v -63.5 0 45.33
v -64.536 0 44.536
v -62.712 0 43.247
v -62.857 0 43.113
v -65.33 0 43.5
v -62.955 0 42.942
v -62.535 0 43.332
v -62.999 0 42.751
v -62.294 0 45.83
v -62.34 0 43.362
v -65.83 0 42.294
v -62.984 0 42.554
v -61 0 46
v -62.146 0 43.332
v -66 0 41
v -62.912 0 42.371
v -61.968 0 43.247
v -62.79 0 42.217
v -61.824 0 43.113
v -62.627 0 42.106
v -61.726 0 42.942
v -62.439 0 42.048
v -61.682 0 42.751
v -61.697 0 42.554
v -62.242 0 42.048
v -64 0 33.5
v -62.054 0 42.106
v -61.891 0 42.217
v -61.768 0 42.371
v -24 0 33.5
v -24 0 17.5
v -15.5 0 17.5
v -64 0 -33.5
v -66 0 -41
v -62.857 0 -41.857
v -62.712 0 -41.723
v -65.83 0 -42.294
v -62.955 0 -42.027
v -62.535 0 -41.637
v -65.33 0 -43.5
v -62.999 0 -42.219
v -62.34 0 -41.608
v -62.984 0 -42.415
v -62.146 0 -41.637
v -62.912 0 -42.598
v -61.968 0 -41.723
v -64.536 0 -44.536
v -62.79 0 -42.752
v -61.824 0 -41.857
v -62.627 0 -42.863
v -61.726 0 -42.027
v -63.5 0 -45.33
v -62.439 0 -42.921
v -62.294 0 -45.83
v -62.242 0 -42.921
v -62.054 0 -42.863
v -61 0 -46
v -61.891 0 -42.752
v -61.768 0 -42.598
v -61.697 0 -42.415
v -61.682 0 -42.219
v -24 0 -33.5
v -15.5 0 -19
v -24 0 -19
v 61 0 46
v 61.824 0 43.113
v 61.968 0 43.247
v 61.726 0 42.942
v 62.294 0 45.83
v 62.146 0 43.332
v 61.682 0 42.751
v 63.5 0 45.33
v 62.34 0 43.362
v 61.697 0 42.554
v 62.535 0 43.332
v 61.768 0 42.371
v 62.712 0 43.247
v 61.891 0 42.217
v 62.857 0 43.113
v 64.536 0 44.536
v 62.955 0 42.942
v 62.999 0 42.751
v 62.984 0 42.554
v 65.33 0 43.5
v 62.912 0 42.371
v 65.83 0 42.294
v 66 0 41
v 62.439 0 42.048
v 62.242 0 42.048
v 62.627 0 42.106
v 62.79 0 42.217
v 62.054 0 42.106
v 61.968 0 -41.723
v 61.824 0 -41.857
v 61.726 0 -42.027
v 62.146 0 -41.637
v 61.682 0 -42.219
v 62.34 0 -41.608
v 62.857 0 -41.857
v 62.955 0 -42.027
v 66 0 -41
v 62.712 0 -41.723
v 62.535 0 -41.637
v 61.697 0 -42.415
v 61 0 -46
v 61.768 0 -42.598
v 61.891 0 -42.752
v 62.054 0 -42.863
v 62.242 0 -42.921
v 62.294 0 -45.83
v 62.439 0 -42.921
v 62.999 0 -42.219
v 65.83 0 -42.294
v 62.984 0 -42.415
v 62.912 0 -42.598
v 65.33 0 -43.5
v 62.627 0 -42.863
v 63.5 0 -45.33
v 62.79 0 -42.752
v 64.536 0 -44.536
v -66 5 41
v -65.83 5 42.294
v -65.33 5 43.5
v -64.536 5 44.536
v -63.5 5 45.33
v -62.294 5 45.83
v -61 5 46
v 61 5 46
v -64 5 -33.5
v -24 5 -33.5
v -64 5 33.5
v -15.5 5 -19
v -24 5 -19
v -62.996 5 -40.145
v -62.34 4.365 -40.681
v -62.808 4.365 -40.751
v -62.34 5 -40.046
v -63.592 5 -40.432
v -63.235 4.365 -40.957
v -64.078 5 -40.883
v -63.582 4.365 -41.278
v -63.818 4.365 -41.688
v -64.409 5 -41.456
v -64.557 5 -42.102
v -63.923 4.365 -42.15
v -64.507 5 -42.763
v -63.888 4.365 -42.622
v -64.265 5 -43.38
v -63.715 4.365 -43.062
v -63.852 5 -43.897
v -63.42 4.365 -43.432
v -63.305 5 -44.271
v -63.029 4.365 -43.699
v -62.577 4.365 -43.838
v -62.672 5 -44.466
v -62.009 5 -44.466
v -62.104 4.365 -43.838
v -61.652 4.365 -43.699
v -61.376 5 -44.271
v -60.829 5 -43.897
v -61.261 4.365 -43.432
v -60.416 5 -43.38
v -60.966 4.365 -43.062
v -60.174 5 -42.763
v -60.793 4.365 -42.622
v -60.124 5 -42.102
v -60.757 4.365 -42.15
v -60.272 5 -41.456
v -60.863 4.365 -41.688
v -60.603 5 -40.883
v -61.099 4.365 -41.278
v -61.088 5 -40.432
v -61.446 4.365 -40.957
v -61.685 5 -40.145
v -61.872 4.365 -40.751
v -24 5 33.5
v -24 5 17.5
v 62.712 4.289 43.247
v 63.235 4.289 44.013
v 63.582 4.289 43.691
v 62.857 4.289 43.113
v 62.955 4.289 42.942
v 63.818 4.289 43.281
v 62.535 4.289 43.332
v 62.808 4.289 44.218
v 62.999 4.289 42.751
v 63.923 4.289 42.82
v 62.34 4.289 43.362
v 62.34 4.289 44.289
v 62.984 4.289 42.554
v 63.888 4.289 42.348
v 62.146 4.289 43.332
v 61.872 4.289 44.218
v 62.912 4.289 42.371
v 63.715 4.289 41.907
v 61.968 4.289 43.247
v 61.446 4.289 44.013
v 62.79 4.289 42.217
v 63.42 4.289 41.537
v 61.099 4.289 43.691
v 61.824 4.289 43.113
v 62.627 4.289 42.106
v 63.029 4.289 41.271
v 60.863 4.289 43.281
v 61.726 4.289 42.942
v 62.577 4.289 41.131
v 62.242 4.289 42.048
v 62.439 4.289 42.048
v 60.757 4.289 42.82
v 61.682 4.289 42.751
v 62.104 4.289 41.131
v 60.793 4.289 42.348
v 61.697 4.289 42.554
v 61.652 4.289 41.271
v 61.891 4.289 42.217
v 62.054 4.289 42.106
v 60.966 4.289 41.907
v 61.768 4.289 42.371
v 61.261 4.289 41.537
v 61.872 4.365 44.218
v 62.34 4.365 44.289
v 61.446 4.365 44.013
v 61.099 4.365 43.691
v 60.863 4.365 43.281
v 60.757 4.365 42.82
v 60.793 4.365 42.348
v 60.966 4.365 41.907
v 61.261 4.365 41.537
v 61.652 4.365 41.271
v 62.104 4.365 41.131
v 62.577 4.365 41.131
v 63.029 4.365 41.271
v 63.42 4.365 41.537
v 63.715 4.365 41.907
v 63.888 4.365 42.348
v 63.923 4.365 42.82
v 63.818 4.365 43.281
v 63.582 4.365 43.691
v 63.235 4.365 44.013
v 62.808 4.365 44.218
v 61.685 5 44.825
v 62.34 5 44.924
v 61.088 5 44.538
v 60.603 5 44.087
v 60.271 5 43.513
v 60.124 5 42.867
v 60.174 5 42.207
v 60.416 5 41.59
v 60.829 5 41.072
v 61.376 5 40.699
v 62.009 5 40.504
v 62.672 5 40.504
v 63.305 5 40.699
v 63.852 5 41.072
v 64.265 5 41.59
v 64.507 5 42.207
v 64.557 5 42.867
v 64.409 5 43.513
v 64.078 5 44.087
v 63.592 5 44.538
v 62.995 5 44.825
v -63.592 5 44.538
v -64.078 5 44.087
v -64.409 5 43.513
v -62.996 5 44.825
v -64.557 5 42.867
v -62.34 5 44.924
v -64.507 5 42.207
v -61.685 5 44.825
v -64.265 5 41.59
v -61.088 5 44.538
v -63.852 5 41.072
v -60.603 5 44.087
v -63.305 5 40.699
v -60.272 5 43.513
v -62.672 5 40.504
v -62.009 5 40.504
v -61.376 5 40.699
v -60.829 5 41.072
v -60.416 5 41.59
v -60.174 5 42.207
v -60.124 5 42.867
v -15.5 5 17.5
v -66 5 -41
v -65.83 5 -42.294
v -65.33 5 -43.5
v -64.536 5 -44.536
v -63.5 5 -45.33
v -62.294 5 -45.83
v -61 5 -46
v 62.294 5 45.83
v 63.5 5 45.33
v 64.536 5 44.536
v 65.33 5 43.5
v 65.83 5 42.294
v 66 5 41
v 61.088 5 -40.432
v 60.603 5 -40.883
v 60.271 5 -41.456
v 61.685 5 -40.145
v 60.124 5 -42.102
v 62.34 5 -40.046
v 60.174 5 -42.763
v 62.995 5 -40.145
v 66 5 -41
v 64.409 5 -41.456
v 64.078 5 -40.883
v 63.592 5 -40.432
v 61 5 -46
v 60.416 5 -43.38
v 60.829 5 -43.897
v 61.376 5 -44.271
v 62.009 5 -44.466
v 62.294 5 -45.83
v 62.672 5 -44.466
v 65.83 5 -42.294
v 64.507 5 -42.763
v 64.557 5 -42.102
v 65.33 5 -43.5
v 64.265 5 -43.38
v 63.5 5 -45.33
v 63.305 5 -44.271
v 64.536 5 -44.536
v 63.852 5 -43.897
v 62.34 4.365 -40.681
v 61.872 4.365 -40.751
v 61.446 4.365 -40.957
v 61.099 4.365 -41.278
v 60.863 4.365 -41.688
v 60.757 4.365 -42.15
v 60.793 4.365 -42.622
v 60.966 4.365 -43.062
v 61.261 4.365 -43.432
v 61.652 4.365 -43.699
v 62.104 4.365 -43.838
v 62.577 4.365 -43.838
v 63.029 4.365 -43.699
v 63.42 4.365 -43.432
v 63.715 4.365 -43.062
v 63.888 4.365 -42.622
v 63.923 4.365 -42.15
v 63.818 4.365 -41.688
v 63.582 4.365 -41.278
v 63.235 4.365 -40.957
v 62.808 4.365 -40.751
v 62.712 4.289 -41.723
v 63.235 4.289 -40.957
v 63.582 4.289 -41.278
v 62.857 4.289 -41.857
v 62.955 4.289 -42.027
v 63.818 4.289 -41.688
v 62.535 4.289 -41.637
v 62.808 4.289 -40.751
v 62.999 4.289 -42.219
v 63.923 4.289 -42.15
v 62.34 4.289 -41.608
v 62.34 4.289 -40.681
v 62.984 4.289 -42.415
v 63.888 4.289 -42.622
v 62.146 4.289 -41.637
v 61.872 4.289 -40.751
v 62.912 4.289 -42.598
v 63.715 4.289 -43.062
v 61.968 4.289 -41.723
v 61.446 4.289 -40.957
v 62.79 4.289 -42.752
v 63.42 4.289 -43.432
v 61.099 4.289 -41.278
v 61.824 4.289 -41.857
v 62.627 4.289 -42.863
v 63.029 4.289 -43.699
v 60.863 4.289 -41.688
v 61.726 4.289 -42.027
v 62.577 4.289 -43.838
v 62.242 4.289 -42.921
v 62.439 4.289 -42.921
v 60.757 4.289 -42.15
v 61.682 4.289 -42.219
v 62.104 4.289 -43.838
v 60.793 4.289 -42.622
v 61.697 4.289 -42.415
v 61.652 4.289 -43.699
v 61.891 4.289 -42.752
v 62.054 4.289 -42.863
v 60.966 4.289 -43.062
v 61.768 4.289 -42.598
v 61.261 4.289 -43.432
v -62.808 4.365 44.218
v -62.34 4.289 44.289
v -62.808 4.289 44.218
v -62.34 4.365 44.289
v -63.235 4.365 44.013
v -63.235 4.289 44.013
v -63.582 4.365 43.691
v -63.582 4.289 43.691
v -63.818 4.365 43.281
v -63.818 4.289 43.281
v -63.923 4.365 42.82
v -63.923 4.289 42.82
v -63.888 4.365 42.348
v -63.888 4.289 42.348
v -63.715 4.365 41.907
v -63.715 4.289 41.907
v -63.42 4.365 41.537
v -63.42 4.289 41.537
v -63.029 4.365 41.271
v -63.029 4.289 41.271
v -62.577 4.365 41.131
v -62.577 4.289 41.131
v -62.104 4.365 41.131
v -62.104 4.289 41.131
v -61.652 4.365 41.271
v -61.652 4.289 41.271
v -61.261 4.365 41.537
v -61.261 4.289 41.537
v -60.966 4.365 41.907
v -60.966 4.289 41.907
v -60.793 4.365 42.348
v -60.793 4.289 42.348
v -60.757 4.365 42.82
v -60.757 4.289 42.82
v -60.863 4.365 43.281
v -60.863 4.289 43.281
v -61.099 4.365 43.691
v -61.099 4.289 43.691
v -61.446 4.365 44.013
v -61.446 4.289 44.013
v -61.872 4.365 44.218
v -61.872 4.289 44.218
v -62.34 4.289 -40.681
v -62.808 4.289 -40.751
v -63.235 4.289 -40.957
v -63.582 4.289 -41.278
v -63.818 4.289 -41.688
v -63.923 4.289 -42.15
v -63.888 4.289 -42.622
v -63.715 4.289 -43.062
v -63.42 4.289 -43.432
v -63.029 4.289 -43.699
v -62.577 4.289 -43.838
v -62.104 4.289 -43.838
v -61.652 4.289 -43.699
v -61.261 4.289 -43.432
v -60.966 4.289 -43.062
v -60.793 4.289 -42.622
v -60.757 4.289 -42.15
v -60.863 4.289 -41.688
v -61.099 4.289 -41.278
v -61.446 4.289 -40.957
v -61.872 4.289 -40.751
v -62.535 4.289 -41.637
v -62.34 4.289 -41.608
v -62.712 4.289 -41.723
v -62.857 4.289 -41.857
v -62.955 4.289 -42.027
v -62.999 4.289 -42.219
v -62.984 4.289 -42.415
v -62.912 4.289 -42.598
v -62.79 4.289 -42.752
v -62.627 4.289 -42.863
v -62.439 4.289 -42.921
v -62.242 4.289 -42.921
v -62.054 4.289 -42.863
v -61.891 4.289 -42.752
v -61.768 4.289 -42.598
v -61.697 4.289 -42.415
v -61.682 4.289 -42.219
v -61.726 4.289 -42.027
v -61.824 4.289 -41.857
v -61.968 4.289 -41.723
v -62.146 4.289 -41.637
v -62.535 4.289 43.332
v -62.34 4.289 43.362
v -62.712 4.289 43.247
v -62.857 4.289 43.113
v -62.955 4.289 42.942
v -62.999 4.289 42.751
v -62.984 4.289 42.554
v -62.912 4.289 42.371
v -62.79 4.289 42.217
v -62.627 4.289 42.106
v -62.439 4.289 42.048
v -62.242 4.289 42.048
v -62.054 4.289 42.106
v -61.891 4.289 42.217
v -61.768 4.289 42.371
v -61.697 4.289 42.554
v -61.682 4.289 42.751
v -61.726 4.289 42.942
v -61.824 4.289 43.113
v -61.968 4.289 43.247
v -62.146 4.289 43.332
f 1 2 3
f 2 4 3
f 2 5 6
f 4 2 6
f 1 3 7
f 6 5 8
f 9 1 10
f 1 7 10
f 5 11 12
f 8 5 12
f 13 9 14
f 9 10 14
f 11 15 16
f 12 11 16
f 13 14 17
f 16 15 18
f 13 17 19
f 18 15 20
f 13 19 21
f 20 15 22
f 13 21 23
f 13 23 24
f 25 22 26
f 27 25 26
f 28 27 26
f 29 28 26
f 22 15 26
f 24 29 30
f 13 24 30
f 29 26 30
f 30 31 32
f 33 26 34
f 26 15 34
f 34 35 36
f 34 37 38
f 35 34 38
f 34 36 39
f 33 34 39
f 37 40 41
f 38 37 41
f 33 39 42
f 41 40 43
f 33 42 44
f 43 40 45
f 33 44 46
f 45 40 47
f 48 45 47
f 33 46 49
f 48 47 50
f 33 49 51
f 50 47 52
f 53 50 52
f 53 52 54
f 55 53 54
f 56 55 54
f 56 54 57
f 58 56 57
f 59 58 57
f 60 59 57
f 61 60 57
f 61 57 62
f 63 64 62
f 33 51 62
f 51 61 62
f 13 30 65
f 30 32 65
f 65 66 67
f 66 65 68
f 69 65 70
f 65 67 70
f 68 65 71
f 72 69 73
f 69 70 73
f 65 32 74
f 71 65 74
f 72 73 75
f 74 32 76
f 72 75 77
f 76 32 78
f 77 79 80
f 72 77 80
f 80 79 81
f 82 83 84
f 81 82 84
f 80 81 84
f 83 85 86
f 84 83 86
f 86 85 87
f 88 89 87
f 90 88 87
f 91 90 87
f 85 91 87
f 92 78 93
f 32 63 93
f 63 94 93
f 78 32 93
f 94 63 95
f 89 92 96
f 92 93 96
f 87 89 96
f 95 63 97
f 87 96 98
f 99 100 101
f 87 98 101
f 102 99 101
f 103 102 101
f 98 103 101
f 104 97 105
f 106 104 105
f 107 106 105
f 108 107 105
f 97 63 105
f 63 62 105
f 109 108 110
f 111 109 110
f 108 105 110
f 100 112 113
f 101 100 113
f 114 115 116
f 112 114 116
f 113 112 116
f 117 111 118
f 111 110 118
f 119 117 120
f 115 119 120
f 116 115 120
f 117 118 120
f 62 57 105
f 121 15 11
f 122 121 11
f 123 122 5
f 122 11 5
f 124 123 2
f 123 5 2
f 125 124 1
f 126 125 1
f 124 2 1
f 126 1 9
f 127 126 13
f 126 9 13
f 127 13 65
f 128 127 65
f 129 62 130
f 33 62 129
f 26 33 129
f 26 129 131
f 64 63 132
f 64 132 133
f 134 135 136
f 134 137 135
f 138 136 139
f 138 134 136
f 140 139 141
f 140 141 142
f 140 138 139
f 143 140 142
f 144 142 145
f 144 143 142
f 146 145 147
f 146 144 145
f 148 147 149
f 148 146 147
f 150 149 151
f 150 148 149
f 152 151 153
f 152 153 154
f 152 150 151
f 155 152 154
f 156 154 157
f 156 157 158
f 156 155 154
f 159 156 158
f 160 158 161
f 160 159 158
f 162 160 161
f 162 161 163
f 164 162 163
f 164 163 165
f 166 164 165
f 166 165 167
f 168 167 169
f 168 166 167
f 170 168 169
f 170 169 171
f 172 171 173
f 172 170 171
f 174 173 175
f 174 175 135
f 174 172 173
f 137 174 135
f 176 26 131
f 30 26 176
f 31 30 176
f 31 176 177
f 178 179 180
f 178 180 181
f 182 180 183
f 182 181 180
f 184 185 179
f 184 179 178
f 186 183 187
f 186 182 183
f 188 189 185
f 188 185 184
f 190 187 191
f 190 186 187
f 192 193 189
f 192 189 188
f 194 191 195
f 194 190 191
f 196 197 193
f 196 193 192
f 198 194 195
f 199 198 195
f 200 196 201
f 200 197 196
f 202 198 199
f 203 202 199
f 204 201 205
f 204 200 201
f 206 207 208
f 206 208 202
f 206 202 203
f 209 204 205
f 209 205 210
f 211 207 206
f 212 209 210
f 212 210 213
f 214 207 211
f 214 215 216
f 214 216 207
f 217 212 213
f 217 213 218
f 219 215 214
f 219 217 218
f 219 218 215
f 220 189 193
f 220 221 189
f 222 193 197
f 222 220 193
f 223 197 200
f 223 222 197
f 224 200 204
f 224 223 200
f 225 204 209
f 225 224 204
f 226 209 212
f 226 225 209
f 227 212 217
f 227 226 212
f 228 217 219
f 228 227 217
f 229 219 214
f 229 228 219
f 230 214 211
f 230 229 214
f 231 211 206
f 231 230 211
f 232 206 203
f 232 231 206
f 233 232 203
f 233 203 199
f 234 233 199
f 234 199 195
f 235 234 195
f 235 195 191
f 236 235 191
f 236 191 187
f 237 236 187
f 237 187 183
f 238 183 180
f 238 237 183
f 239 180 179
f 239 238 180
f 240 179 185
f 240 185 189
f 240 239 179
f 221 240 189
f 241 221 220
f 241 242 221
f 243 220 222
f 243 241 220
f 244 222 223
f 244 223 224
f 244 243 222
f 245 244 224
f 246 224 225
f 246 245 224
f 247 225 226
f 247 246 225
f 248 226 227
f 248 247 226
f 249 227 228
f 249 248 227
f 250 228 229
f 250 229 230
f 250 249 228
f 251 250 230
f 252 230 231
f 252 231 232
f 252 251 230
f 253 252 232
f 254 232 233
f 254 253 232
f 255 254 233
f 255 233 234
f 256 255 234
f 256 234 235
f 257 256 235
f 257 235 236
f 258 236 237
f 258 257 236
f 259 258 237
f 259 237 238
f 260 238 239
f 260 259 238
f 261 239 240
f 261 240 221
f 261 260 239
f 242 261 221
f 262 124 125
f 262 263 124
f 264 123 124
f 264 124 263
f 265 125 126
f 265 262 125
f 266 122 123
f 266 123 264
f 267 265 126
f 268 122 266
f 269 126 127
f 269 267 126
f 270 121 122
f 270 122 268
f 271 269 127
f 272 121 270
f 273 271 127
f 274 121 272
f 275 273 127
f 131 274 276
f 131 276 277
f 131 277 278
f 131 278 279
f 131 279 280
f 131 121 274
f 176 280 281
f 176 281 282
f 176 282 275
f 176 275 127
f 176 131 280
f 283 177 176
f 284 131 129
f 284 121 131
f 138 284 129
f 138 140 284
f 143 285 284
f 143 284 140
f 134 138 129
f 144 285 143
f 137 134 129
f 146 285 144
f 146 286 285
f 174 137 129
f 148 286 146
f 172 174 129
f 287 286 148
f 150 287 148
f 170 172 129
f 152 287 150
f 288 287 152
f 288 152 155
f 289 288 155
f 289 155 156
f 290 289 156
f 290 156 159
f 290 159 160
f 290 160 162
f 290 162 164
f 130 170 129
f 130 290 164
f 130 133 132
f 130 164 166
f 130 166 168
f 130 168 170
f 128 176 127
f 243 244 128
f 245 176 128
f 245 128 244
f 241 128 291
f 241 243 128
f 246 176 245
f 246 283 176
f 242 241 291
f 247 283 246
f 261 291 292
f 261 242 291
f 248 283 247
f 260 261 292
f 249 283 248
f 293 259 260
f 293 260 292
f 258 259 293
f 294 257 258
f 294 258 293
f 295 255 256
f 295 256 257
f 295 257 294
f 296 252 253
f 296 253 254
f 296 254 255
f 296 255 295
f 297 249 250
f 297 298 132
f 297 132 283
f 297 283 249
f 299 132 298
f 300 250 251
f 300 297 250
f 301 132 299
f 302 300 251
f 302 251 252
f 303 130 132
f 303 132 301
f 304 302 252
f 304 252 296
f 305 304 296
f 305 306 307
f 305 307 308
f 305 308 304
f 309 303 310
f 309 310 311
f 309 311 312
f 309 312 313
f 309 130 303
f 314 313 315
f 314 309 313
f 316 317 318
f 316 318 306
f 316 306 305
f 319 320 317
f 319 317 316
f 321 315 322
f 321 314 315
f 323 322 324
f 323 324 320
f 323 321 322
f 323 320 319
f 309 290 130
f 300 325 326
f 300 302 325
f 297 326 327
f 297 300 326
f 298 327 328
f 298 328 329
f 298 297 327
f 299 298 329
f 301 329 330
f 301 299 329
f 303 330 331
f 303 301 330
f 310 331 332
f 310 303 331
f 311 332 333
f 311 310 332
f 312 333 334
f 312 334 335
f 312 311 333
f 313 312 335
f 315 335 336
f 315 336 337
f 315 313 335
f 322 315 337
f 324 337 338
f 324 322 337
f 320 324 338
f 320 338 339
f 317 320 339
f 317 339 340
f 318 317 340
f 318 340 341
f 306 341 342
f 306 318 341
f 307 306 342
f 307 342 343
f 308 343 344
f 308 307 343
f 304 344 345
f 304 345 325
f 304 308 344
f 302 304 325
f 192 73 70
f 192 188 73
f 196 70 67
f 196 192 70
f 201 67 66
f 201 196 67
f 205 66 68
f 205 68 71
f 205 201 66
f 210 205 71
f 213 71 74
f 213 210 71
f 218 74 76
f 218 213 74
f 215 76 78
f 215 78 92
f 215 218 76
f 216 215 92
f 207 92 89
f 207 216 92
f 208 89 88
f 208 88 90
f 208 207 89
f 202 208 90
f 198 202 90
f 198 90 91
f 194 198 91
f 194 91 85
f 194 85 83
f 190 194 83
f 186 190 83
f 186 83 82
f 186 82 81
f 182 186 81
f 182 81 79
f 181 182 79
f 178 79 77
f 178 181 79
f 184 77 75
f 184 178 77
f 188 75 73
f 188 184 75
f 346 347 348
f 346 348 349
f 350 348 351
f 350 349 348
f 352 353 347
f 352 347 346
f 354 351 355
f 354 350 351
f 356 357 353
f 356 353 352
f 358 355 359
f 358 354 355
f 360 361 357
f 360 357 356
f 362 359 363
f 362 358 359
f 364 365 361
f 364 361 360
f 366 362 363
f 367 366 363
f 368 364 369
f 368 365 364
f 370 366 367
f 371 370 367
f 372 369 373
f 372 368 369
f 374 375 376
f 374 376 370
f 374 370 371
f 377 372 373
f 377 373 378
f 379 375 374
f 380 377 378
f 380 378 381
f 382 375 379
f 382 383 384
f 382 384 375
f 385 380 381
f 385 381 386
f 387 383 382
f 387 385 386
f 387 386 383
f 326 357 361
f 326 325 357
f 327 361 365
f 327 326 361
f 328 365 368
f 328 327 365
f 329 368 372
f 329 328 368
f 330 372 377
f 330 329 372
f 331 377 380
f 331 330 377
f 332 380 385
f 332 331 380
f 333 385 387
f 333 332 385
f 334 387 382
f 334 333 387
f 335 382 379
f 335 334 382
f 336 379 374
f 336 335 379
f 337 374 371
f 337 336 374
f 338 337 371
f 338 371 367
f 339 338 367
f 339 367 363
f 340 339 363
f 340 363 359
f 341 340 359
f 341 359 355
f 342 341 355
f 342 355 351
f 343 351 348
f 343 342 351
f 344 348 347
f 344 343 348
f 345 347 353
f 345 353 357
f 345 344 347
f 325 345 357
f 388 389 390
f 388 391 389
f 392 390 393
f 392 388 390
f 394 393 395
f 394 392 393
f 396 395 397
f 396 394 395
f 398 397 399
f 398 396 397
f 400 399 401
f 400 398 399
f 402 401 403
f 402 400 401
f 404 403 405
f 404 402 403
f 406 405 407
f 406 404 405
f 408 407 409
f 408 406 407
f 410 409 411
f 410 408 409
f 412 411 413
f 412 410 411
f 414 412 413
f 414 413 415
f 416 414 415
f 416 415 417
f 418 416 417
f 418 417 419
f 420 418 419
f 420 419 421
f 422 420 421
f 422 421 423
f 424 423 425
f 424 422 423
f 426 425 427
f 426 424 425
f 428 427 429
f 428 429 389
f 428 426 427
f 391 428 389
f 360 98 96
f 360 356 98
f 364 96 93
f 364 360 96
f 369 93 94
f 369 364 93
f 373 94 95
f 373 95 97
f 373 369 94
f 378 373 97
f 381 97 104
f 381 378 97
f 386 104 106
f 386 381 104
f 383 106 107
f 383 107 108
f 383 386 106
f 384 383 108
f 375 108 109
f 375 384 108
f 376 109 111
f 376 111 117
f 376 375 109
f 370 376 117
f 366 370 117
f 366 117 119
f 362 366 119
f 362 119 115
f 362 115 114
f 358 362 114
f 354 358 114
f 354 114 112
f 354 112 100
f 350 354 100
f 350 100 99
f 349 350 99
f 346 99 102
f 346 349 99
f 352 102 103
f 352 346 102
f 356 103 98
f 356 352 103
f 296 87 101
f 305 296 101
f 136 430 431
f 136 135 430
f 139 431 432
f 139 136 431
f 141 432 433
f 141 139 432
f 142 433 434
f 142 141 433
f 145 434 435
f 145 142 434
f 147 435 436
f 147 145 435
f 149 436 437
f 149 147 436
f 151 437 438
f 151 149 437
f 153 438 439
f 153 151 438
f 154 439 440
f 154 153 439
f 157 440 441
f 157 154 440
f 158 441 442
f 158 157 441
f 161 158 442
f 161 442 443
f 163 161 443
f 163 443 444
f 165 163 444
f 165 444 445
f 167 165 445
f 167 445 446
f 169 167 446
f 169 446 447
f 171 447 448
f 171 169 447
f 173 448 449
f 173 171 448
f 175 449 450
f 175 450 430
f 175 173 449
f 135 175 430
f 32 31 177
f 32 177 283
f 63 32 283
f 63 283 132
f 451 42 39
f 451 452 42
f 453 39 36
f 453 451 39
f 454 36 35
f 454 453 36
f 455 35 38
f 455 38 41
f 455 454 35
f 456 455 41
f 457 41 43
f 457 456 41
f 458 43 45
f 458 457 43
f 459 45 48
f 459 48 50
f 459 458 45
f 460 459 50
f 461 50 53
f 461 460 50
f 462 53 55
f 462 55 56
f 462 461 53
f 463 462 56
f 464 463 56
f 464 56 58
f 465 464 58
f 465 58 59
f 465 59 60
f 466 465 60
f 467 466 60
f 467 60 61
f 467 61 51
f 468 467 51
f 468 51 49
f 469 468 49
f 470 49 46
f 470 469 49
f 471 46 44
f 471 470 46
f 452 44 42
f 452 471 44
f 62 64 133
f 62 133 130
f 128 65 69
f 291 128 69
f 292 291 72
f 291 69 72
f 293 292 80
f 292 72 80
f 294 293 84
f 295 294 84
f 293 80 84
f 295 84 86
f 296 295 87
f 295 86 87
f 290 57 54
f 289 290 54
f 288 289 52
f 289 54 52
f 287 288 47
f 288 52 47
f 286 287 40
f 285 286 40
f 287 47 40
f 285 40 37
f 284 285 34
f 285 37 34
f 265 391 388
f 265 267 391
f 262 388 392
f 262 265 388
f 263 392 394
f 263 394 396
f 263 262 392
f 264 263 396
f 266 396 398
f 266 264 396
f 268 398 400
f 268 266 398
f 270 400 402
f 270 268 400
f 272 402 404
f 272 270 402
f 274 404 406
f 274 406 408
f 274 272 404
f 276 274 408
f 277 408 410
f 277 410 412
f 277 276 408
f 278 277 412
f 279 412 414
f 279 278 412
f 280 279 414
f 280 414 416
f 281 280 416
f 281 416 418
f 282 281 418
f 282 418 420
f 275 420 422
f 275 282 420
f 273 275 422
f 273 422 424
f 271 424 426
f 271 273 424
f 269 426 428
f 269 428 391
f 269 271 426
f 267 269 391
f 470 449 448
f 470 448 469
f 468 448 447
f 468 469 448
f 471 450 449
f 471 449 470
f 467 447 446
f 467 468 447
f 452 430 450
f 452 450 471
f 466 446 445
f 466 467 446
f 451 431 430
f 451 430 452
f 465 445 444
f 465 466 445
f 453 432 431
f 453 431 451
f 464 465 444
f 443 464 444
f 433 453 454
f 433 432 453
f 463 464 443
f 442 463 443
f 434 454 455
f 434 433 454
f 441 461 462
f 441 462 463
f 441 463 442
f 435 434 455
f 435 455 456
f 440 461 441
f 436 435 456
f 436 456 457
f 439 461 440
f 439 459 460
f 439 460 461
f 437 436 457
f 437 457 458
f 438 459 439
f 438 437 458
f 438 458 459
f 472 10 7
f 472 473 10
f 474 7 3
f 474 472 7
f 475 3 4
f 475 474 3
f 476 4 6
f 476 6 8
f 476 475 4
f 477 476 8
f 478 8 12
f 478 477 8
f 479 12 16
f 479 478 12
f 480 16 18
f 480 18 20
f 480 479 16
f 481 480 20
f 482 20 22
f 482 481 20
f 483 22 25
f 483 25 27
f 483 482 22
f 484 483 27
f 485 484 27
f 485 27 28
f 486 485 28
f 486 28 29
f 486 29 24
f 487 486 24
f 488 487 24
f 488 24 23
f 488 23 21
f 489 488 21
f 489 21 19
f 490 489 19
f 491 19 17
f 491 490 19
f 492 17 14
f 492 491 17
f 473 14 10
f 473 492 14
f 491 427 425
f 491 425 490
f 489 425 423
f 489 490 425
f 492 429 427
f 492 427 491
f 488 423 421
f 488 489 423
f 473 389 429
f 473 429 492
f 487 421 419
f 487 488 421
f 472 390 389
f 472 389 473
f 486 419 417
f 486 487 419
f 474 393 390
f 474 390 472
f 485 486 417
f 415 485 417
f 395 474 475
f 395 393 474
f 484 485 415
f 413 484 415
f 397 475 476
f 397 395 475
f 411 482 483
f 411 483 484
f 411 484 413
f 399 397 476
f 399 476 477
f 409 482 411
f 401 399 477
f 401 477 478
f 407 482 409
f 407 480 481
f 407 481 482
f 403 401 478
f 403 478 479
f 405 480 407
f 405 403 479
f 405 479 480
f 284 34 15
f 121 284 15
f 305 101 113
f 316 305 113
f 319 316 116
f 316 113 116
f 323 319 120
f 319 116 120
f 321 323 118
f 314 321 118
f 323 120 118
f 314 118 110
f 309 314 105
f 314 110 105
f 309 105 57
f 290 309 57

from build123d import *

# Parameters (mm, degrees)
BOSS_EXTRUDE1_DEPTH                         = 5
CBORE_FOR_00_BINDING_HEAD_MACHINE_S_2_COUNT = 2
CBORE_FOR_00_BINDING_HEAD_MACHINE_S_2_PITCH = 124.680760017
CBORE_FOR_00_BINDING_HEAD_MACHINE_S_3_COUNT = 2
CBORE_FOR_00_BINDING_HEAD_MACHINE_S_3_PITCH = 84.969496715
CBORE_FOR_00_BINDING_HEAD_MACHINE_S_4_COUNT = 2
CBORE_FOR_00_BINDING_HEAD_MACHINE_S_4_PITCH = 150.881103158


with BuildPart() as part:
    # Sketch2 → Boss-Extrude1 (new body)
    with BuildSketch(Plane(origin=(0, 0, 0), x_dir=(1, 0, 0), z_dir=(0, 1, 0))):
        with BuildLine():
            Line((-61, -46), (61, -46))
            ThreePointArc((61, -46), (64.535533906, -44.535533906), (66, -41))
            Line((66, -41), (66, 41))
            ThreePointArc((66, 41), (64.535533906, 44.535533906), (61, 46))
            Line((61, 46), (-61, 46))
            ThreePointArc((-61, 46), (-64.535533906, 44.535533906), (-66, 41))
            Line((-66, 41), (-66, -41))
            ThreePointArc((-66, -41), (-64.535533906, -44.535533906), (-61, -46))
        make_face()
        Polygon((-64, -33.5), (-24, -33.5), (-24, -17.5), (-15.5, -17.5), (-15.5, 19), (-24, 19), (-24, 33.5), (-64, 33.5), align=None, mode=Mode.SUBTRACT)
    extrude(amount=BOSS_EXTRUDE1_DEPTH)

    # Sketch5 → CBORE for #00 Binding Head Machine Screw1 (revolve, cut)
    with BuildSketch(Plane(origin=(-62.340407583, 5, -42.268283337), x_dir=(0, 0, 1), z_dir=(1, 0, 0))):
        Polygon((0, 0), (0, 5.396808353), (0.6604, 5), (0.6604, 0.7112), (1.5875, 0.7112), (1.5875, 0.635), (2.2225, 0), align=None)
    cbore_for_00_binding_head_machine_screw = revolve(axis=Axis((-62.340407583, 11.35, -42.268283337), (0, -1, 0)), mode=Mode.SUBTRACT)

    # CBORE for _00 Binding Head Machine S 2: CBORE for #00 Binding Head Machine Screw1 ×2
    with Locations(*[(i * CBORE_FOR_00_BINDING_HEAD_MACHINE_S_2_PITCH, 0, 0) for i in range(1, CBORE_FOR_00_BINDING_HEAD_MACHINE_S_2_COUNT)]):
        add(cbore_for_00_binding_head_machine_screw, mode=Mode.SUBTRACT)

    # CBORE for _00 Binding Head Machine S 3: CBORE for #00 Binding Head Machine Screw1 ×2
    with Locations(*[(0, 0, i * CBORE_FOR_00_BINDING_HEAD_MACHINE_S_3_PITCH) for i in range(1, CBORE_FOR_00_BINDING_HEAD_MACHINE_S_3_COUNT)]):
        add(cbore_for_00_binding_head_machine_screw, mode=Mode.SUBTRACT)

    # CBORE for _00 Binding Head Machine S 4: CBORE for #00 Binding Head Machine Screw1 ×2
    with Locations(*[Vector(0.8263510632316995, 0, 0.563155325195314) * (i * CBORE_FOR_00_BINDING_HEAD_MACHINE_S_4_PITCH) for i in range(1, CBORE_FOR_00_BINDING_HEAD_MACHINE_S_4_COUNT)]):
        add(cbore_for_00_binding_head_machine_screw, mode=Mode.SUBTRACT)


solid = part.part
